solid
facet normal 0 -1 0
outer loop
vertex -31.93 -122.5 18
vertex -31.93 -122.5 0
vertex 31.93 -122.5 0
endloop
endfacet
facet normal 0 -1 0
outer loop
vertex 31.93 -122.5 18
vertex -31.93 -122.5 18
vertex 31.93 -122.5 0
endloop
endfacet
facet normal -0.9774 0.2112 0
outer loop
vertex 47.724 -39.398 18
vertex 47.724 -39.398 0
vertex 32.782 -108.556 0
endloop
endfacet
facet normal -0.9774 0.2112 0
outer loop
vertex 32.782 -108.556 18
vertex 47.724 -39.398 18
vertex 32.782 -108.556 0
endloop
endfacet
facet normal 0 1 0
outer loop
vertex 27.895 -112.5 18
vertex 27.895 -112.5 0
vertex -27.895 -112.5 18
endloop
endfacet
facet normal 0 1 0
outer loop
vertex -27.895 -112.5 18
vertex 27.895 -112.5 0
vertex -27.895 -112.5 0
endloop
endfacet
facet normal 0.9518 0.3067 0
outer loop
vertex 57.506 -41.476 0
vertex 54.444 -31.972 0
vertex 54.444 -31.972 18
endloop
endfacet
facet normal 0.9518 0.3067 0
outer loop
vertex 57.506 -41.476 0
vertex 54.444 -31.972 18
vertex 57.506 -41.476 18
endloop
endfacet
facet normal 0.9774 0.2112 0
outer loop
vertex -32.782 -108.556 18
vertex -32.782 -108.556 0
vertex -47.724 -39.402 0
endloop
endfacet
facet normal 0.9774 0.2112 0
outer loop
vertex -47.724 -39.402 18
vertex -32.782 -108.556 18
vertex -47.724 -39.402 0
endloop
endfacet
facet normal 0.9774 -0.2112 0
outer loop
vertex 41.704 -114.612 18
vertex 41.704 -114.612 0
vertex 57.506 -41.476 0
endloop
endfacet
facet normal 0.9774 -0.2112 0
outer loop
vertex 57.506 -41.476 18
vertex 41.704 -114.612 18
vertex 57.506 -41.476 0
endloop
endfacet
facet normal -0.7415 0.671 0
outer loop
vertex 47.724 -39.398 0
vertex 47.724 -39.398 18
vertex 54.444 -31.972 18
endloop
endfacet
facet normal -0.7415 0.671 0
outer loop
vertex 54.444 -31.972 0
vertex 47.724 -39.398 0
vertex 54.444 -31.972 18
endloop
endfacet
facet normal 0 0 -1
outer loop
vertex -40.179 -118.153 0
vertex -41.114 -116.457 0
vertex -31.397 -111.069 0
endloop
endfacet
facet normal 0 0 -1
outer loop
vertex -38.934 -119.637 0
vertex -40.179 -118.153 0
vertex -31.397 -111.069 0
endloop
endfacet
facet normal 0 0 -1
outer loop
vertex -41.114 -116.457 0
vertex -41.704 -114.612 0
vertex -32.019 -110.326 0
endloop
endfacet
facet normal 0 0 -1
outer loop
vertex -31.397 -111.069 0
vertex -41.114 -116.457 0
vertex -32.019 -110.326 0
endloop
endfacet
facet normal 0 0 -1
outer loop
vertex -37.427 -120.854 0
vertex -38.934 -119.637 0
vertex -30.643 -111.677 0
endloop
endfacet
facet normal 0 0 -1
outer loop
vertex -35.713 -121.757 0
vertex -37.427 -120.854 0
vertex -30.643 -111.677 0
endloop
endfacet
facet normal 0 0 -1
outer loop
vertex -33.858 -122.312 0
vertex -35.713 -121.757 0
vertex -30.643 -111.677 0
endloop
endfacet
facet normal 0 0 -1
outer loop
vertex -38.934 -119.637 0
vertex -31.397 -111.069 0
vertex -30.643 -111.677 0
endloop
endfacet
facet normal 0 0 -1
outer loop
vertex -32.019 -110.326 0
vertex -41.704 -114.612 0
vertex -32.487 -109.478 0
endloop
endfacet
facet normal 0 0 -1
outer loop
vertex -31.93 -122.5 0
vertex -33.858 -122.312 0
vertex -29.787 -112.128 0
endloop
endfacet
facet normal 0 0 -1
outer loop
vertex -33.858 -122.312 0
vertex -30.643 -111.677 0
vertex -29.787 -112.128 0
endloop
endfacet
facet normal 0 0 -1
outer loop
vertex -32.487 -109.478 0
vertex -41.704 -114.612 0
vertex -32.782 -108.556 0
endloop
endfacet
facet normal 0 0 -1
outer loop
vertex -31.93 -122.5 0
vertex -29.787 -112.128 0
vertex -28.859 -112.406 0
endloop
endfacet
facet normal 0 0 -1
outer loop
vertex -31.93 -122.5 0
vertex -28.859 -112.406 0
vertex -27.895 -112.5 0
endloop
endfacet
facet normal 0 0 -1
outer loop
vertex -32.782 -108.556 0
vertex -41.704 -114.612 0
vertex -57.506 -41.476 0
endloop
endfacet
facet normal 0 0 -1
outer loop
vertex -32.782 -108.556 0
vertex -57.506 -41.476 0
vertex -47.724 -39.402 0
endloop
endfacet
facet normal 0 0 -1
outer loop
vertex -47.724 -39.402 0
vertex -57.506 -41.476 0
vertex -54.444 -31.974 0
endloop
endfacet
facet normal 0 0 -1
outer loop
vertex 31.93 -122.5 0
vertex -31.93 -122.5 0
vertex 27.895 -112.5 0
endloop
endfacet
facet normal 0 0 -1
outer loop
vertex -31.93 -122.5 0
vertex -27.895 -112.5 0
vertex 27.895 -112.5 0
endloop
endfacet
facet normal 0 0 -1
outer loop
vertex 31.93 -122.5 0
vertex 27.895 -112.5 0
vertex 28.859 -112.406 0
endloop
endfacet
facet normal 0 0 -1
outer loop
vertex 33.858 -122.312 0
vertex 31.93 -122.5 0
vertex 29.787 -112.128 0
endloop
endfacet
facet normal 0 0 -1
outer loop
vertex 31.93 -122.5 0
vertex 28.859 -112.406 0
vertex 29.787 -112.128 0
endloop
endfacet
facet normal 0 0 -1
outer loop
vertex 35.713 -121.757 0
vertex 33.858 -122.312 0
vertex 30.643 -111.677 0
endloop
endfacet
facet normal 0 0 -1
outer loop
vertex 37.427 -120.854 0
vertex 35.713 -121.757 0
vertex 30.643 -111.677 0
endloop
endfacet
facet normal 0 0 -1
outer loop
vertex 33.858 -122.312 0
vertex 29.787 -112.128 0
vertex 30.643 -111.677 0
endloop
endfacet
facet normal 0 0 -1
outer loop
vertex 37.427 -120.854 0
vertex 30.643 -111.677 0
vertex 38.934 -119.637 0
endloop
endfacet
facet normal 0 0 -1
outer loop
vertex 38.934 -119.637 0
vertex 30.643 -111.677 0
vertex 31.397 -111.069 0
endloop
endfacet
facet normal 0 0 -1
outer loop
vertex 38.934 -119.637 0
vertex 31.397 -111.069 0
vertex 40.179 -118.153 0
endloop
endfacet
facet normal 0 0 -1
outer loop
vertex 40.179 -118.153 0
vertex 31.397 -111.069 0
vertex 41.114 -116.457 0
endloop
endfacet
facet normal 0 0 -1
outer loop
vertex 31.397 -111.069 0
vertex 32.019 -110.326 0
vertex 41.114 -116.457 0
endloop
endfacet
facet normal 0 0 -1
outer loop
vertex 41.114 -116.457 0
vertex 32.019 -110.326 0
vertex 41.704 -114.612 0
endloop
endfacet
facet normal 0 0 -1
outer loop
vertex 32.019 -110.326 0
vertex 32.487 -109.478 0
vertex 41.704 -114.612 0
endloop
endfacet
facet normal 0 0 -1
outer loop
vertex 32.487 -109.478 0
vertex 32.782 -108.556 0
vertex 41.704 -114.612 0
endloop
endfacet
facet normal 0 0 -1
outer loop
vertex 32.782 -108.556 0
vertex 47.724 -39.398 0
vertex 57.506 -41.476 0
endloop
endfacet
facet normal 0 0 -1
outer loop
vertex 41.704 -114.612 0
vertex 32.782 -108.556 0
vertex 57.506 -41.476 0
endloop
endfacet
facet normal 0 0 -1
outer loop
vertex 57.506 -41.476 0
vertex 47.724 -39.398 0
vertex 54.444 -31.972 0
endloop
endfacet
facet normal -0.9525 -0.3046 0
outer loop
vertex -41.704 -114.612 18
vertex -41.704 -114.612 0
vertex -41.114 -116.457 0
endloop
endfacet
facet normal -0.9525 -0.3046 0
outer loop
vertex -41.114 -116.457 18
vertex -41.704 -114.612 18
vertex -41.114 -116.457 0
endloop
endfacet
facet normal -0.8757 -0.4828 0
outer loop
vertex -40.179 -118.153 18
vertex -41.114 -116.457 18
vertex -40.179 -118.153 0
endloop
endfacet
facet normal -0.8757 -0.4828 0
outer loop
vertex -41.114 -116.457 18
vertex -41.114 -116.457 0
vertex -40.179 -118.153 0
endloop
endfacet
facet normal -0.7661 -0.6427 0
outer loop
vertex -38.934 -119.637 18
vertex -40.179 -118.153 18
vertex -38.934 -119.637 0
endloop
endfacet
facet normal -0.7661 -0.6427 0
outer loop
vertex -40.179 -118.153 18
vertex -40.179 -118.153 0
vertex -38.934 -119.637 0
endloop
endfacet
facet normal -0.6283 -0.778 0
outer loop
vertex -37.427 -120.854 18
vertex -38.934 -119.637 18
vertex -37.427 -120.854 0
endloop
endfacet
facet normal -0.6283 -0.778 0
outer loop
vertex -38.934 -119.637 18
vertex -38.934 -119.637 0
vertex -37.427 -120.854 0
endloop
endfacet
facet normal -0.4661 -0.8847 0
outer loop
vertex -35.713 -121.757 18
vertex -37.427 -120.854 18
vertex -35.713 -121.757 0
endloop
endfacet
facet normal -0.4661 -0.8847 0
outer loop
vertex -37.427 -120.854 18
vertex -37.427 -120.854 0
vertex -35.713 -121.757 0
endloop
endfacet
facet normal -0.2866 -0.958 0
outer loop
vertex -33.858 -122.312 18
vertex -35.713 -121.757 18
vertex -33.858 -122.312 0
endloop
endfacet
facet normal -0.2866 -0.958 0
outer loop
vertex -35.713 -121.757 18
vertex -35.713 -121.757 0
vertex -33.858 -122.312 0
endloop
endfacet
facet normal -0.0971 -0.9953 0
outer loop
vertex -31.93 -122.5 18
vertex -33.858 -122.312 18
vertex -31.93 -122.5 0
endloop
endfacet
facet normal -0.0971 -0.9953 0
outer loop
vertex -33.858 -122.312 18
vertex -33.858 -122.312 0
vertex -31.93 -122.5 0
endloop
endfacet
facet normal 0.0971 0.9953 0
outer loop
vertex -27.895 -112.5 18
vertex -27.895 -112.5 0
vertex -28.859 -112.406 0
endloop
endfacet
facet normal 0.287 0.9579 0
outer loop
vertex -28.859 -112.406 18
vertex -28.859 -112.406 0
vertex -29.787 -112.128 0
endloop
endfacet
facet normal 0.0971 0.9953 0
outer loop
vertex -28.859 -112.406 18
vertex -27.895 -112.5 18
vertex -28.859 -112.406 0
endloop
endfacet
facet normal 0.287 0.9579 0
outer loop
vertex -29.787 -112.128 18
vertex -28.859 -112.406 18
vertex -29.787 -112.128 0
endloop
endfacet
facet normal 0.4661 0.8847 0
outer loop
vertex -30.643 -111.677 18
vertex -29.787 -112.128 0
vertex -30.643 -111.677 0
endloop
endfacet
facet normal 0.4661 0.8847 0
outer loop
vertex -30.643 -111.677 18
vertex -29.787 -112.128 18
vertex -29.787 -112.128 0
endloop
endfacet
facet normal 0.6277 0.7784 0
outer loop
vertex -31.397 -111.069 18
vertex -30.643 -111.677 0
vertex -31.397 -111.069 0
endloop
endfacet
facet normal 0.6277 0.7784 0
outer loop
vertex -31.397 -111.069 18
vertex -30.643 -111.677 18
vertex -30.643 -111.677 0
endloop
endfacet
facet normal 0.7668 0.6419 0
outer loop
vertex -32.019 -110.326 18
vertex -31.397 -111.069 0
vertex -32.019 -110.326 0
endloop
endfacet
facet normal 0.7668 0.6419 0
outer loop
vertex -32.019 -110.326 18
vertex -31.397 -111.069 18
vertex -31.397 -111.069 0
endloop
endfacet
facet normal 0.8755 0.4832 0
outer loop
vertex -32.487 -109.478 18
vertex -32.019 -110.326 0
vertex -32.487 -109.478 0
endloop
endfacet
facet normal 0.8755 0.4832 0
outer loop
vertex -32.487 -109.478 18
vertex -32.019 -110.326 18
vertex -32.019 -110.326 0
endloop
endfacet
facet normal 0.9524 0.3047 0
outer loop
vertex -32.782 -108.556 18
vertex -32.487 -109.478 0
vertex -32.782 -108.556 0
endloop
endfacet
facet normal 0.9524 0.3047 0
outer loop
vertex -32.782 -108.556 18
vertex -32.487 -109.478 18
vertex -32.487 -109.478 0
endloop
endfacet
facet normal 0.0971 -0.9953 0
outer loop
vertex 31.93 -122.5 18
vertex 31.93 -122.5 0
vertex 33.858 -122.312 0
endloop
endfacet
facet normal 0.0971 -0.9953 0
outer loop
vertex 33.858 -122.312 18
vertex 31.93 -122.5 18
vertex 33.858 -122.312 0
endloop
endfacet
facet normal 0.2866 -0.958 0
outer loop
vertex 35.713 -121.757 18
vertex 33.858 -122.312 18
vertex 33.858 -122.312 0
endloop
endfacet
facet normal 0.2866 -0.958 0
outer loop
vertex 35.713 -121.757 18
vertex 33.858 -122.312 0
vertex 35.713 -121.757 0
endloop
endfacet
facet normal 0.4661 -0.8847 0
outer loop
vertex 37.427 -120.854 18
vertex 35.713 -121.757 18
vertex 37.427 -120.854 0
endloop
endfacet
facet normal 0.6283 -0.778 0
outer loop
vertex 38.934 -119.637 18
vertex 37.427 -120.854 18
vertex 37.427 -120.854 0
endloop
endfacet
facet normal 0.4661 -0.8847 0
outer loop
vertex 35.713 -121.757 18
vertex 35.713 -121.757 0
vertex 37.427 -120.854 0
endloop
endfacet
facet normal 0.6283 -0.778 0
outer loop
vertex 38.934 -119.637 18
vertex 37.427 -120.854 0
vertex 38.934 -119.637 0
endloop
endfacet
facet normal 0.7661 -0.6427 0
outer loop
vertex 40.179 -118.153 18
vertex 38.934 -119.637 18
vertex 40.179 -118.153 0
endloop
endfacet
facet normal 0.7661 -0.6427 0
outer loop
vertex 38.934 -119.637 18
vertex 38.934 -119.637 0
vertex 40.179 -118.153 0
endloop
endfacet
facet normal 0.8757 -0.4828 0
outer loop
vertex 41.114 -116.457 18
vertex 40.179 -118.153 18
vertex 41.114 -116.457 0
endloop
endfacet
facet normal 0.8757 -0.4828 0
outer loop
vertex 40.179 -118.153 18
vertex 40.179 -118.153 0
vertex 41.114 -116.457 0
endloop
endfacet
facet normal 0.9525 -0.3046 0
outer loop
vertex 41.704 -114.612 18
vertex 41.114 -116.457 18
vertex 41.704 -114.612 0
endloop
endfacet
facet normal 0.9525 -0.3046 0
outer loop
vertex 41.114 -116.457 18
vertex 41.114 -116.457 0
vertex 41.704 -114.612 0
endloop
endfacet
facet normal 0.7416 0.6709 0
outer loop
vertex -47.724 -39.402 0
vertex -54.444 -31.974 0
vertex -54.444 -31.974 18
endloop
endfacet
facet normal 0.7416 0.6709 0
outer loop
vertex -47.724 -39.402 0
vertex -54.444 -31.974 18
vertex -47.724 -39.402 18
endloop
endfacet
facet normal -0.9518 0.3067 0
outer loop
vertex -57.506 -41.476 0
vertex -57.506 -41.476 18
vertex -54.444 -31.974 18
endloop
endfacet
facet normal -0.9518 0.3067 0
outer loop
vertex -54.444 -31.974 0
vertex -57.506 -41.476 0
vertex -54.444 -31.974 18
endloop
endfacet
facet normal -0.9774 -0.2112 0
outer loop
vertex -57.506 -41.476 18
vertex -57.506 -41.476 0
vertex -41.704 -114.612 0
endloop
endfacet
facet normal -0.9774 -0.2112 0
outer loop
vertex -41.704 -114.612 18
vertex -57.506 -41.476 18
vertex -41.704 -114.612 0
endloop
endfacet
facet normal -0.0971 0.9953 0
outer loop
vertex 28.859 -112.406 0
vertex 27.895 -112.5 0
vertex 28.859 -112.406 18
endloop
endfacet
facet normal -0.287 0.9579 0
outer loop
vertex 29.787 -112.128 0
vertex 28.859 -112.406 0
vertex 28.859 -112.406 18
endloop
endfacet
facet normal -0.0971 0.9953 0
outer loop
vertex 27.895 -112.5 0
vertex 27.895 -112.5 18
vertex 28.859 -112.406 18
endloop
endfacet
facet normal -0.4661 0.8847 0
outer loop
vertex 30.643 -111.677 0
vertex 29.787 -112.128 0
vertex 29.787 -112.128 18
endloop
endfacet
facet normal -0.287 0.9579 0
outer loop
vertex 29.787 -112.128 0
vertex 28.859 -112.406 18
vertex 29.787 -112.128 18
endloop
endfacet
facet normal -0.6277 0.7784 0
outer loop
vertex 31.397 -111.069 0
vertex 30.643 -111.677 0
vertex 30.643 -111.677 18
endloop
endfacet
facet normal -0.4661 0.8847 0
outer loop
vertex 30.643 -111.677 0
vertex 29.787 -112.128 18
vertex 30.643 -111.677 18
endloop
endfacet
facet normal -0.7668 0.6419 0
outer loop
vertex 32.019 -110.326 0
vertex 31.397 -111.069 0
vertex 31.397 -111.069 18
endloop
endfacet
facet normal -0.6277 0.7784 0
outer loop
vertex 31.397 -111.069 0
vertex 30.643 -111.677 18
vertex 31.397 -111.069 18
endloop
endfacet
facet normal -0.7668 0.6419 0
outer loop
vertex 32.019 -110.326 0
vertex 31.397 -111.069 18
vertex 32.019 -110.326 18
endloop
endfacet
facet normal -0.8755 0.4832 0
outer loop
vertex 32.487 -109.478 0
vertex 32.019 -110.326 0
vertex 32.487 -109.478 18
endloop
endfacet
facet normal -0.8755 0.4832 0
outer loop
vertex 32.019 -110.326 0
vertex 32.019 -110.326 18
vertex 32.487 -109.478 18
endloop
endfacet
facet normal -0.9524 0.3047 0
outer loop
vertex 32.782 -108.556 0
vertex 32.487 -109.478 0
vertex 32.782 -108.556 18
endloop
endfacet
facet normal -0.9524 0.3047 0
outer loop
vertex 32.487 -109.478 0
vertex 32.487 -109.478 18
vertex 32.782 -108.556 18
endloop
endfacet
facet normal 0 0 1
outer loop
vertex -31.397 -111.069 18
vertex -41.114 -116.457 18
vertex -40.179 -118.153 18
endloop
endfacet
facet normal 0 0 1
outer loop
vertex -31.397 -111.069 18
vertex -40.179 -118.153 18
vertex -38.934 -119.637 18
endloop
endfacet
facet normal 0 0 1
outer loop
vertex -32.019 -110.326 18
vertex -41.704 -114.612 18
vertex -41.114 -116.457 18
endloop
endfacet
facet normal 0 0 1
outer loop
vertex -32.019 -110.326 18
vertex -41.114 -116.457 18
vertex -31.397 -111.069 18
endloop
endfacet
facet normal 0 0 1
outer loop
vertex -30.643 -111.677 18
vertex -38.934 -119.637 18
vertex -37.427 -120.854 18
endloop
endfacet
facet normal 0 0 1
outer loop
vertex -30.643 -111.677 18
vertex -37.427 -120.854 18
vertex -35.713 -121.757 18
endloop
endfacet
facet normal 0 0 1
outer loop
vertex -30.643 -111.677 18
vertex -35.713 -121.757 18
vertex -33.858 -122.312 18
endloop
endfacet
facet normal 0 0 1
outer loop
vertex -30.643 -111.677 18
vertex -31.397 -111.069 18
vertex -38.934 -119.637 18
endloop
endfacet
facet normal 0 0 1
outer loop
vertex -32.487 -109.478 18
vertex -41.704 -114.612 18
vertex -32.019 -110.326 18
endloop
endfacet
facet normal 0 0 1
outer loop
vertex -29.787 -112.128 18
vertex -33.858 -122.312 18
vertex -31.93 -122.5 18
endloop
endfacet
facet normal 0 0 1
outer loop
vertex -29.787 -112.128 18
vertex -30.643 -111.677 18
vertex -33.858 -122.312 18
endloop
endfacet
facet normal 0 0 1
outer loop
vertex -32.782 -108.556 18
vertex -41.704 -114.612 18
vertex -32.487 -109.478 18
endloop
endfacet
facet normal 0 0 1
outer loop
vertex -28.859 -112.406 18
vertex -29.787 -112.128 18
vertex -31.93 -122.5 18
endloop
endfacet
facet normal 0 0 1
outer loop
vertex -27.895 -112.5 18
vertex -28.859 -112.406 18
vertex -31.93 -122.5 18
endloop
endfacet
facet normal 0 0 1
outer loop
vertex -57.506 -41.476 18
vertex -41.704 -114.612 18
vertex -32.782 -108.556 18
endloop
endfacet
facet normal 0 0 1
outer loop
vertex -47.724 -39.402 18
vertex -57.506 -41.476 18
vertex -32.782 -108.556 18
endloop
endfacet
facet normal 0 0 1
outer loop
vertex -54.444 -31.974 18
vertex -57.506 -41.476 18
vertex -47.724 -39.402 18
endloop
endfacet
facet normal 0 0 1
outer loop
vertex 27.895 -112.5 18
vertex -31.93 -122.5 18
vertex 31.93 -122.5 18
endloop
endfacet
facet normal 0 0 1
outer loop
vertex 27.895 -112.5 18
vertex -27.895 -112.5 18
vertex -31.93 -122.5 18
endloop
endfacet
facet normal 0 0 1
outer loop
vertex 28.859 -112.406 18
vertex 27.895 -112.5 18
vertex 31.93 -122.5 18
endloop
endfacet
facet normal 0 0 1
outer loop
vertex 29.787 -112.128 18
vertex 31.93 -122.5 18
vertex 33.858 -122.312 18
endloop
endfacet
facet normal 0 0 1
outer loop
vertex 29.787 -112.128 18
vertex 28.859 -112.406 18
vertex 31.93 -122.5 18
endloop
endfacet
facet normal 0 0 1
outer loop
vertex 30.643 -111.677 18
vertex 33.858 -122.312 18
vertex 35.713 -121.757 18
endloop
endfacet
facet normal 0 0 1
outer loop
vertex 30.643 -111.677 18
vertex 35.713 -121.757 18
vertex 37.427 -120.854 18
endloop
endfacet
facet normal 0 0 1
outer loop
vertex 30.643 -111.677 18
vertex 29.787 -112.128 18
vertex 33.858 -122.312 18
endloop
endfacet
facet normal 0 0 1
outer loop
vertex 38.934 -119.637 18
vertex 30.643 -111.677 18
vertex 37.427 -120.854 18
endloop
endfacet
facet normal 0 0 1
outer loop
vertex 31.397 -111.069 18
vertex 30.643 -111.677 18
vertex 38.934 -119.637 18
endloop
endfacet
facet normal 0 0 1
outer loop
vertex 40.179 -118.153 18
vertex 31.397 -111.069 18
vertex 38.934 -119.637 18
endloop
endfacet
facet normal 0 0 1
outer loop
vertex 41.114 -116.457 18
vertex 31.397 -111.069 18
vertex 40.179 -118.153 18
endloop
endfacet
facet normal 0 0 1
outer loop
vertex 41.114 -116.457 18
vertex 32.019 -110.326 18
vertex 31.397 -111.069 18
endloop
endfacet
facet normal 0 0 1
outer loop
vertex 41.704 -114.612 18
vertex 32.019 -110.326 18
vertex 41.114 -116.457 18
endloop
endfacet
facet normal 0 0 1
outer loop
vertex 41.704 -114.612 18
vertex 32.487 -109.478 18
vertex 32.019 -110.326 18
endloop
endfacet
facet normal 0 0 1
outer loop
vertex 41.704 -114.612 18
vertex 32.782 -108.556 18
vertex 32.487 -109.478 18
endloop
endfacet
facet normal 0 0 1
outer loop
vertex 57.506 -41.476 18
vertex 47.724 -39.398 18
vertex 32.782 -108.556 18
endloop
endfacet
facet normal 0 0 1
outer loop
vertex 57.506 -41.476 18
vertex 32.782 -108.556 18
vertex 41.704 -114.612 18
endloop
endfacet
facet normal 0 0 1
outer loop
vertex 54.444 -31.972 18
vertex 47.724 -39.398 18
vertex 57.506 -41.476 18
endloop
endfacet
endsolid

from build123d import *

# Parameters (mm, degrees)
SKETCH3_R           = 4.5
BOSS_EXTRUDE1_DEPTH = 18
FILLET1_R           = 5
FILLET2_R           = 5
CUT_EXTRUDE2_DEPTH  = 19.0000001


with BuildPart() as part:
    # Sketch3 → Boss-Extrude1 (new body)
    with BuildSketch(Plane.XY):
        with BuildLine():
            Line((-31.929873349, -122.5), (31.929873349, -122.5))
            ThreePointArc((31.929873349, -122.5), (38.210043039, -120.281996444), (41.704324989, -114.611893732))
            Line((41.704324989, -114.611893732), (73.308387301, 31.660797012))
            ThreePointArc((73.308387301, 31.660797012), (0, 122.5), (-73.308387301, 31.660797012))
            Line((-73.308387301, 31.660797012), (-41.704324989, -114.611893732))
            ThreePointArc((-41.704324989, -114.611893732), (-38.210043039, -120.281996444), (-31.929873349, -122.5))
        make_face()
        with Locations((50, -12.5)):
            Circle(SKETCH3_R, mode=Mode.SUBTRACT)
        with Locations((50, 87.5)):
            Circle(SKETCH3_R, mode=Mode.SUBTRACT)
        with Locations((-50, 87.5)):
            Circle(SKETCH3_R, mode=Mode.SUBTRACT)
        with Locations((-50, -12.5)):
            Circle(SKETCH3_R, mode=Mode.SUBTRACT)
        with BuildLine():
            Line((-31.929873349, -112.5), (-51.284518999, -22.921132901))
            ThreePointArc((-51.284518999, -22.921132901), (-39.736825778, -10.282511582), (-55.472323677, -3.538768301))
            Line((-55.472323677, -3.538768301), (-63.533935661, 33.772690744))
            ThreePointArc((-63.533935661, 33.772690744), (-64.271528905, 57.204152316), (-56.648842383, 79.373322021))
            ThreePointArc((-56.648842383, 79.373322021), (-41.800877501, 80.940702001), (-43.531035666, 95.770580418))
            ThreePointArc((-43.531035666, 95.770580418), (0, 112.5), (43.531035666, 95.770580418))
            ThreePointArc((43.531035666, 95.770580418), (41.800877501, 80.940702001), (56.648842383, 79.373322021))
            ThreePointArc((56.648842383, 79.373322021), (64.271528905, 57.204152316), (63.533935661, 33.772690744))
            Line((63.533935661, 33.772690744), (55.472323677, -3.538768301))
            ThreePointArc((55.472323677, -3.538768301), (39.736825778, -10.282511582), (51.284518999, -22.921132901))
            Line((51.284518999, -22.921132901), (31.929873349, -112.5))
            Line((31.929873349, -112.5), (-31.929873349, -112.5))
        make_face(mode=Mode.SUBTRACT)
    extrude(amount=BOSS_EXTRUDE1_DEPTH)

    # Fillet1
    fillet1_edges = [part.edges().sort_by_distance(p)[0] for p in [
        (-31.929873349, -112.5, 9),
        (31.929873349, -112.5, 9),
    ]]
    fillet(fillet1_edges, radius=FILLET1_R)

    # Fillet2
    fillet2_edges = [part.edges().sort_by_distance(p)[0] for p in [
        (51.284518999, -22.921132901, 9),
        (55.472323677, -3.538768301, 9),
        (56.648842383, 79.373322021, 9),
        (43.531035666, 95.770580418, 9),
        (-43.531035666, 95.770580418, 9),
        (-56.648842383, 79.373322021, 9),
        (-55.472323677, -3.538768301, 9),
        (-51.284518999, -22.921132901, 9),
    ]]
    fillet(fillet2_edges, radius=FILLET2_R)

    # Sketch5 → Cut-Extrude2 (cut, through all)
    with BuildSketch(Plane.XY.offset(18)):
        Polygon((47.724403212, -39.39837277), (54.444339069, -31.972010438), (57.506356145, -41.47554836), (172.58444794, 157.130363262), (-148.336678287, 157.130363262), (-57.506356145, -41.47554836), (-54.443982463, -31.973660914), (-47.723687693, -39.401684395), align=None)
    extrude(amount=-CUT_EXTRUDE2_DEPTH, mode=Mode.SUBTRACT)


solid = part.part
